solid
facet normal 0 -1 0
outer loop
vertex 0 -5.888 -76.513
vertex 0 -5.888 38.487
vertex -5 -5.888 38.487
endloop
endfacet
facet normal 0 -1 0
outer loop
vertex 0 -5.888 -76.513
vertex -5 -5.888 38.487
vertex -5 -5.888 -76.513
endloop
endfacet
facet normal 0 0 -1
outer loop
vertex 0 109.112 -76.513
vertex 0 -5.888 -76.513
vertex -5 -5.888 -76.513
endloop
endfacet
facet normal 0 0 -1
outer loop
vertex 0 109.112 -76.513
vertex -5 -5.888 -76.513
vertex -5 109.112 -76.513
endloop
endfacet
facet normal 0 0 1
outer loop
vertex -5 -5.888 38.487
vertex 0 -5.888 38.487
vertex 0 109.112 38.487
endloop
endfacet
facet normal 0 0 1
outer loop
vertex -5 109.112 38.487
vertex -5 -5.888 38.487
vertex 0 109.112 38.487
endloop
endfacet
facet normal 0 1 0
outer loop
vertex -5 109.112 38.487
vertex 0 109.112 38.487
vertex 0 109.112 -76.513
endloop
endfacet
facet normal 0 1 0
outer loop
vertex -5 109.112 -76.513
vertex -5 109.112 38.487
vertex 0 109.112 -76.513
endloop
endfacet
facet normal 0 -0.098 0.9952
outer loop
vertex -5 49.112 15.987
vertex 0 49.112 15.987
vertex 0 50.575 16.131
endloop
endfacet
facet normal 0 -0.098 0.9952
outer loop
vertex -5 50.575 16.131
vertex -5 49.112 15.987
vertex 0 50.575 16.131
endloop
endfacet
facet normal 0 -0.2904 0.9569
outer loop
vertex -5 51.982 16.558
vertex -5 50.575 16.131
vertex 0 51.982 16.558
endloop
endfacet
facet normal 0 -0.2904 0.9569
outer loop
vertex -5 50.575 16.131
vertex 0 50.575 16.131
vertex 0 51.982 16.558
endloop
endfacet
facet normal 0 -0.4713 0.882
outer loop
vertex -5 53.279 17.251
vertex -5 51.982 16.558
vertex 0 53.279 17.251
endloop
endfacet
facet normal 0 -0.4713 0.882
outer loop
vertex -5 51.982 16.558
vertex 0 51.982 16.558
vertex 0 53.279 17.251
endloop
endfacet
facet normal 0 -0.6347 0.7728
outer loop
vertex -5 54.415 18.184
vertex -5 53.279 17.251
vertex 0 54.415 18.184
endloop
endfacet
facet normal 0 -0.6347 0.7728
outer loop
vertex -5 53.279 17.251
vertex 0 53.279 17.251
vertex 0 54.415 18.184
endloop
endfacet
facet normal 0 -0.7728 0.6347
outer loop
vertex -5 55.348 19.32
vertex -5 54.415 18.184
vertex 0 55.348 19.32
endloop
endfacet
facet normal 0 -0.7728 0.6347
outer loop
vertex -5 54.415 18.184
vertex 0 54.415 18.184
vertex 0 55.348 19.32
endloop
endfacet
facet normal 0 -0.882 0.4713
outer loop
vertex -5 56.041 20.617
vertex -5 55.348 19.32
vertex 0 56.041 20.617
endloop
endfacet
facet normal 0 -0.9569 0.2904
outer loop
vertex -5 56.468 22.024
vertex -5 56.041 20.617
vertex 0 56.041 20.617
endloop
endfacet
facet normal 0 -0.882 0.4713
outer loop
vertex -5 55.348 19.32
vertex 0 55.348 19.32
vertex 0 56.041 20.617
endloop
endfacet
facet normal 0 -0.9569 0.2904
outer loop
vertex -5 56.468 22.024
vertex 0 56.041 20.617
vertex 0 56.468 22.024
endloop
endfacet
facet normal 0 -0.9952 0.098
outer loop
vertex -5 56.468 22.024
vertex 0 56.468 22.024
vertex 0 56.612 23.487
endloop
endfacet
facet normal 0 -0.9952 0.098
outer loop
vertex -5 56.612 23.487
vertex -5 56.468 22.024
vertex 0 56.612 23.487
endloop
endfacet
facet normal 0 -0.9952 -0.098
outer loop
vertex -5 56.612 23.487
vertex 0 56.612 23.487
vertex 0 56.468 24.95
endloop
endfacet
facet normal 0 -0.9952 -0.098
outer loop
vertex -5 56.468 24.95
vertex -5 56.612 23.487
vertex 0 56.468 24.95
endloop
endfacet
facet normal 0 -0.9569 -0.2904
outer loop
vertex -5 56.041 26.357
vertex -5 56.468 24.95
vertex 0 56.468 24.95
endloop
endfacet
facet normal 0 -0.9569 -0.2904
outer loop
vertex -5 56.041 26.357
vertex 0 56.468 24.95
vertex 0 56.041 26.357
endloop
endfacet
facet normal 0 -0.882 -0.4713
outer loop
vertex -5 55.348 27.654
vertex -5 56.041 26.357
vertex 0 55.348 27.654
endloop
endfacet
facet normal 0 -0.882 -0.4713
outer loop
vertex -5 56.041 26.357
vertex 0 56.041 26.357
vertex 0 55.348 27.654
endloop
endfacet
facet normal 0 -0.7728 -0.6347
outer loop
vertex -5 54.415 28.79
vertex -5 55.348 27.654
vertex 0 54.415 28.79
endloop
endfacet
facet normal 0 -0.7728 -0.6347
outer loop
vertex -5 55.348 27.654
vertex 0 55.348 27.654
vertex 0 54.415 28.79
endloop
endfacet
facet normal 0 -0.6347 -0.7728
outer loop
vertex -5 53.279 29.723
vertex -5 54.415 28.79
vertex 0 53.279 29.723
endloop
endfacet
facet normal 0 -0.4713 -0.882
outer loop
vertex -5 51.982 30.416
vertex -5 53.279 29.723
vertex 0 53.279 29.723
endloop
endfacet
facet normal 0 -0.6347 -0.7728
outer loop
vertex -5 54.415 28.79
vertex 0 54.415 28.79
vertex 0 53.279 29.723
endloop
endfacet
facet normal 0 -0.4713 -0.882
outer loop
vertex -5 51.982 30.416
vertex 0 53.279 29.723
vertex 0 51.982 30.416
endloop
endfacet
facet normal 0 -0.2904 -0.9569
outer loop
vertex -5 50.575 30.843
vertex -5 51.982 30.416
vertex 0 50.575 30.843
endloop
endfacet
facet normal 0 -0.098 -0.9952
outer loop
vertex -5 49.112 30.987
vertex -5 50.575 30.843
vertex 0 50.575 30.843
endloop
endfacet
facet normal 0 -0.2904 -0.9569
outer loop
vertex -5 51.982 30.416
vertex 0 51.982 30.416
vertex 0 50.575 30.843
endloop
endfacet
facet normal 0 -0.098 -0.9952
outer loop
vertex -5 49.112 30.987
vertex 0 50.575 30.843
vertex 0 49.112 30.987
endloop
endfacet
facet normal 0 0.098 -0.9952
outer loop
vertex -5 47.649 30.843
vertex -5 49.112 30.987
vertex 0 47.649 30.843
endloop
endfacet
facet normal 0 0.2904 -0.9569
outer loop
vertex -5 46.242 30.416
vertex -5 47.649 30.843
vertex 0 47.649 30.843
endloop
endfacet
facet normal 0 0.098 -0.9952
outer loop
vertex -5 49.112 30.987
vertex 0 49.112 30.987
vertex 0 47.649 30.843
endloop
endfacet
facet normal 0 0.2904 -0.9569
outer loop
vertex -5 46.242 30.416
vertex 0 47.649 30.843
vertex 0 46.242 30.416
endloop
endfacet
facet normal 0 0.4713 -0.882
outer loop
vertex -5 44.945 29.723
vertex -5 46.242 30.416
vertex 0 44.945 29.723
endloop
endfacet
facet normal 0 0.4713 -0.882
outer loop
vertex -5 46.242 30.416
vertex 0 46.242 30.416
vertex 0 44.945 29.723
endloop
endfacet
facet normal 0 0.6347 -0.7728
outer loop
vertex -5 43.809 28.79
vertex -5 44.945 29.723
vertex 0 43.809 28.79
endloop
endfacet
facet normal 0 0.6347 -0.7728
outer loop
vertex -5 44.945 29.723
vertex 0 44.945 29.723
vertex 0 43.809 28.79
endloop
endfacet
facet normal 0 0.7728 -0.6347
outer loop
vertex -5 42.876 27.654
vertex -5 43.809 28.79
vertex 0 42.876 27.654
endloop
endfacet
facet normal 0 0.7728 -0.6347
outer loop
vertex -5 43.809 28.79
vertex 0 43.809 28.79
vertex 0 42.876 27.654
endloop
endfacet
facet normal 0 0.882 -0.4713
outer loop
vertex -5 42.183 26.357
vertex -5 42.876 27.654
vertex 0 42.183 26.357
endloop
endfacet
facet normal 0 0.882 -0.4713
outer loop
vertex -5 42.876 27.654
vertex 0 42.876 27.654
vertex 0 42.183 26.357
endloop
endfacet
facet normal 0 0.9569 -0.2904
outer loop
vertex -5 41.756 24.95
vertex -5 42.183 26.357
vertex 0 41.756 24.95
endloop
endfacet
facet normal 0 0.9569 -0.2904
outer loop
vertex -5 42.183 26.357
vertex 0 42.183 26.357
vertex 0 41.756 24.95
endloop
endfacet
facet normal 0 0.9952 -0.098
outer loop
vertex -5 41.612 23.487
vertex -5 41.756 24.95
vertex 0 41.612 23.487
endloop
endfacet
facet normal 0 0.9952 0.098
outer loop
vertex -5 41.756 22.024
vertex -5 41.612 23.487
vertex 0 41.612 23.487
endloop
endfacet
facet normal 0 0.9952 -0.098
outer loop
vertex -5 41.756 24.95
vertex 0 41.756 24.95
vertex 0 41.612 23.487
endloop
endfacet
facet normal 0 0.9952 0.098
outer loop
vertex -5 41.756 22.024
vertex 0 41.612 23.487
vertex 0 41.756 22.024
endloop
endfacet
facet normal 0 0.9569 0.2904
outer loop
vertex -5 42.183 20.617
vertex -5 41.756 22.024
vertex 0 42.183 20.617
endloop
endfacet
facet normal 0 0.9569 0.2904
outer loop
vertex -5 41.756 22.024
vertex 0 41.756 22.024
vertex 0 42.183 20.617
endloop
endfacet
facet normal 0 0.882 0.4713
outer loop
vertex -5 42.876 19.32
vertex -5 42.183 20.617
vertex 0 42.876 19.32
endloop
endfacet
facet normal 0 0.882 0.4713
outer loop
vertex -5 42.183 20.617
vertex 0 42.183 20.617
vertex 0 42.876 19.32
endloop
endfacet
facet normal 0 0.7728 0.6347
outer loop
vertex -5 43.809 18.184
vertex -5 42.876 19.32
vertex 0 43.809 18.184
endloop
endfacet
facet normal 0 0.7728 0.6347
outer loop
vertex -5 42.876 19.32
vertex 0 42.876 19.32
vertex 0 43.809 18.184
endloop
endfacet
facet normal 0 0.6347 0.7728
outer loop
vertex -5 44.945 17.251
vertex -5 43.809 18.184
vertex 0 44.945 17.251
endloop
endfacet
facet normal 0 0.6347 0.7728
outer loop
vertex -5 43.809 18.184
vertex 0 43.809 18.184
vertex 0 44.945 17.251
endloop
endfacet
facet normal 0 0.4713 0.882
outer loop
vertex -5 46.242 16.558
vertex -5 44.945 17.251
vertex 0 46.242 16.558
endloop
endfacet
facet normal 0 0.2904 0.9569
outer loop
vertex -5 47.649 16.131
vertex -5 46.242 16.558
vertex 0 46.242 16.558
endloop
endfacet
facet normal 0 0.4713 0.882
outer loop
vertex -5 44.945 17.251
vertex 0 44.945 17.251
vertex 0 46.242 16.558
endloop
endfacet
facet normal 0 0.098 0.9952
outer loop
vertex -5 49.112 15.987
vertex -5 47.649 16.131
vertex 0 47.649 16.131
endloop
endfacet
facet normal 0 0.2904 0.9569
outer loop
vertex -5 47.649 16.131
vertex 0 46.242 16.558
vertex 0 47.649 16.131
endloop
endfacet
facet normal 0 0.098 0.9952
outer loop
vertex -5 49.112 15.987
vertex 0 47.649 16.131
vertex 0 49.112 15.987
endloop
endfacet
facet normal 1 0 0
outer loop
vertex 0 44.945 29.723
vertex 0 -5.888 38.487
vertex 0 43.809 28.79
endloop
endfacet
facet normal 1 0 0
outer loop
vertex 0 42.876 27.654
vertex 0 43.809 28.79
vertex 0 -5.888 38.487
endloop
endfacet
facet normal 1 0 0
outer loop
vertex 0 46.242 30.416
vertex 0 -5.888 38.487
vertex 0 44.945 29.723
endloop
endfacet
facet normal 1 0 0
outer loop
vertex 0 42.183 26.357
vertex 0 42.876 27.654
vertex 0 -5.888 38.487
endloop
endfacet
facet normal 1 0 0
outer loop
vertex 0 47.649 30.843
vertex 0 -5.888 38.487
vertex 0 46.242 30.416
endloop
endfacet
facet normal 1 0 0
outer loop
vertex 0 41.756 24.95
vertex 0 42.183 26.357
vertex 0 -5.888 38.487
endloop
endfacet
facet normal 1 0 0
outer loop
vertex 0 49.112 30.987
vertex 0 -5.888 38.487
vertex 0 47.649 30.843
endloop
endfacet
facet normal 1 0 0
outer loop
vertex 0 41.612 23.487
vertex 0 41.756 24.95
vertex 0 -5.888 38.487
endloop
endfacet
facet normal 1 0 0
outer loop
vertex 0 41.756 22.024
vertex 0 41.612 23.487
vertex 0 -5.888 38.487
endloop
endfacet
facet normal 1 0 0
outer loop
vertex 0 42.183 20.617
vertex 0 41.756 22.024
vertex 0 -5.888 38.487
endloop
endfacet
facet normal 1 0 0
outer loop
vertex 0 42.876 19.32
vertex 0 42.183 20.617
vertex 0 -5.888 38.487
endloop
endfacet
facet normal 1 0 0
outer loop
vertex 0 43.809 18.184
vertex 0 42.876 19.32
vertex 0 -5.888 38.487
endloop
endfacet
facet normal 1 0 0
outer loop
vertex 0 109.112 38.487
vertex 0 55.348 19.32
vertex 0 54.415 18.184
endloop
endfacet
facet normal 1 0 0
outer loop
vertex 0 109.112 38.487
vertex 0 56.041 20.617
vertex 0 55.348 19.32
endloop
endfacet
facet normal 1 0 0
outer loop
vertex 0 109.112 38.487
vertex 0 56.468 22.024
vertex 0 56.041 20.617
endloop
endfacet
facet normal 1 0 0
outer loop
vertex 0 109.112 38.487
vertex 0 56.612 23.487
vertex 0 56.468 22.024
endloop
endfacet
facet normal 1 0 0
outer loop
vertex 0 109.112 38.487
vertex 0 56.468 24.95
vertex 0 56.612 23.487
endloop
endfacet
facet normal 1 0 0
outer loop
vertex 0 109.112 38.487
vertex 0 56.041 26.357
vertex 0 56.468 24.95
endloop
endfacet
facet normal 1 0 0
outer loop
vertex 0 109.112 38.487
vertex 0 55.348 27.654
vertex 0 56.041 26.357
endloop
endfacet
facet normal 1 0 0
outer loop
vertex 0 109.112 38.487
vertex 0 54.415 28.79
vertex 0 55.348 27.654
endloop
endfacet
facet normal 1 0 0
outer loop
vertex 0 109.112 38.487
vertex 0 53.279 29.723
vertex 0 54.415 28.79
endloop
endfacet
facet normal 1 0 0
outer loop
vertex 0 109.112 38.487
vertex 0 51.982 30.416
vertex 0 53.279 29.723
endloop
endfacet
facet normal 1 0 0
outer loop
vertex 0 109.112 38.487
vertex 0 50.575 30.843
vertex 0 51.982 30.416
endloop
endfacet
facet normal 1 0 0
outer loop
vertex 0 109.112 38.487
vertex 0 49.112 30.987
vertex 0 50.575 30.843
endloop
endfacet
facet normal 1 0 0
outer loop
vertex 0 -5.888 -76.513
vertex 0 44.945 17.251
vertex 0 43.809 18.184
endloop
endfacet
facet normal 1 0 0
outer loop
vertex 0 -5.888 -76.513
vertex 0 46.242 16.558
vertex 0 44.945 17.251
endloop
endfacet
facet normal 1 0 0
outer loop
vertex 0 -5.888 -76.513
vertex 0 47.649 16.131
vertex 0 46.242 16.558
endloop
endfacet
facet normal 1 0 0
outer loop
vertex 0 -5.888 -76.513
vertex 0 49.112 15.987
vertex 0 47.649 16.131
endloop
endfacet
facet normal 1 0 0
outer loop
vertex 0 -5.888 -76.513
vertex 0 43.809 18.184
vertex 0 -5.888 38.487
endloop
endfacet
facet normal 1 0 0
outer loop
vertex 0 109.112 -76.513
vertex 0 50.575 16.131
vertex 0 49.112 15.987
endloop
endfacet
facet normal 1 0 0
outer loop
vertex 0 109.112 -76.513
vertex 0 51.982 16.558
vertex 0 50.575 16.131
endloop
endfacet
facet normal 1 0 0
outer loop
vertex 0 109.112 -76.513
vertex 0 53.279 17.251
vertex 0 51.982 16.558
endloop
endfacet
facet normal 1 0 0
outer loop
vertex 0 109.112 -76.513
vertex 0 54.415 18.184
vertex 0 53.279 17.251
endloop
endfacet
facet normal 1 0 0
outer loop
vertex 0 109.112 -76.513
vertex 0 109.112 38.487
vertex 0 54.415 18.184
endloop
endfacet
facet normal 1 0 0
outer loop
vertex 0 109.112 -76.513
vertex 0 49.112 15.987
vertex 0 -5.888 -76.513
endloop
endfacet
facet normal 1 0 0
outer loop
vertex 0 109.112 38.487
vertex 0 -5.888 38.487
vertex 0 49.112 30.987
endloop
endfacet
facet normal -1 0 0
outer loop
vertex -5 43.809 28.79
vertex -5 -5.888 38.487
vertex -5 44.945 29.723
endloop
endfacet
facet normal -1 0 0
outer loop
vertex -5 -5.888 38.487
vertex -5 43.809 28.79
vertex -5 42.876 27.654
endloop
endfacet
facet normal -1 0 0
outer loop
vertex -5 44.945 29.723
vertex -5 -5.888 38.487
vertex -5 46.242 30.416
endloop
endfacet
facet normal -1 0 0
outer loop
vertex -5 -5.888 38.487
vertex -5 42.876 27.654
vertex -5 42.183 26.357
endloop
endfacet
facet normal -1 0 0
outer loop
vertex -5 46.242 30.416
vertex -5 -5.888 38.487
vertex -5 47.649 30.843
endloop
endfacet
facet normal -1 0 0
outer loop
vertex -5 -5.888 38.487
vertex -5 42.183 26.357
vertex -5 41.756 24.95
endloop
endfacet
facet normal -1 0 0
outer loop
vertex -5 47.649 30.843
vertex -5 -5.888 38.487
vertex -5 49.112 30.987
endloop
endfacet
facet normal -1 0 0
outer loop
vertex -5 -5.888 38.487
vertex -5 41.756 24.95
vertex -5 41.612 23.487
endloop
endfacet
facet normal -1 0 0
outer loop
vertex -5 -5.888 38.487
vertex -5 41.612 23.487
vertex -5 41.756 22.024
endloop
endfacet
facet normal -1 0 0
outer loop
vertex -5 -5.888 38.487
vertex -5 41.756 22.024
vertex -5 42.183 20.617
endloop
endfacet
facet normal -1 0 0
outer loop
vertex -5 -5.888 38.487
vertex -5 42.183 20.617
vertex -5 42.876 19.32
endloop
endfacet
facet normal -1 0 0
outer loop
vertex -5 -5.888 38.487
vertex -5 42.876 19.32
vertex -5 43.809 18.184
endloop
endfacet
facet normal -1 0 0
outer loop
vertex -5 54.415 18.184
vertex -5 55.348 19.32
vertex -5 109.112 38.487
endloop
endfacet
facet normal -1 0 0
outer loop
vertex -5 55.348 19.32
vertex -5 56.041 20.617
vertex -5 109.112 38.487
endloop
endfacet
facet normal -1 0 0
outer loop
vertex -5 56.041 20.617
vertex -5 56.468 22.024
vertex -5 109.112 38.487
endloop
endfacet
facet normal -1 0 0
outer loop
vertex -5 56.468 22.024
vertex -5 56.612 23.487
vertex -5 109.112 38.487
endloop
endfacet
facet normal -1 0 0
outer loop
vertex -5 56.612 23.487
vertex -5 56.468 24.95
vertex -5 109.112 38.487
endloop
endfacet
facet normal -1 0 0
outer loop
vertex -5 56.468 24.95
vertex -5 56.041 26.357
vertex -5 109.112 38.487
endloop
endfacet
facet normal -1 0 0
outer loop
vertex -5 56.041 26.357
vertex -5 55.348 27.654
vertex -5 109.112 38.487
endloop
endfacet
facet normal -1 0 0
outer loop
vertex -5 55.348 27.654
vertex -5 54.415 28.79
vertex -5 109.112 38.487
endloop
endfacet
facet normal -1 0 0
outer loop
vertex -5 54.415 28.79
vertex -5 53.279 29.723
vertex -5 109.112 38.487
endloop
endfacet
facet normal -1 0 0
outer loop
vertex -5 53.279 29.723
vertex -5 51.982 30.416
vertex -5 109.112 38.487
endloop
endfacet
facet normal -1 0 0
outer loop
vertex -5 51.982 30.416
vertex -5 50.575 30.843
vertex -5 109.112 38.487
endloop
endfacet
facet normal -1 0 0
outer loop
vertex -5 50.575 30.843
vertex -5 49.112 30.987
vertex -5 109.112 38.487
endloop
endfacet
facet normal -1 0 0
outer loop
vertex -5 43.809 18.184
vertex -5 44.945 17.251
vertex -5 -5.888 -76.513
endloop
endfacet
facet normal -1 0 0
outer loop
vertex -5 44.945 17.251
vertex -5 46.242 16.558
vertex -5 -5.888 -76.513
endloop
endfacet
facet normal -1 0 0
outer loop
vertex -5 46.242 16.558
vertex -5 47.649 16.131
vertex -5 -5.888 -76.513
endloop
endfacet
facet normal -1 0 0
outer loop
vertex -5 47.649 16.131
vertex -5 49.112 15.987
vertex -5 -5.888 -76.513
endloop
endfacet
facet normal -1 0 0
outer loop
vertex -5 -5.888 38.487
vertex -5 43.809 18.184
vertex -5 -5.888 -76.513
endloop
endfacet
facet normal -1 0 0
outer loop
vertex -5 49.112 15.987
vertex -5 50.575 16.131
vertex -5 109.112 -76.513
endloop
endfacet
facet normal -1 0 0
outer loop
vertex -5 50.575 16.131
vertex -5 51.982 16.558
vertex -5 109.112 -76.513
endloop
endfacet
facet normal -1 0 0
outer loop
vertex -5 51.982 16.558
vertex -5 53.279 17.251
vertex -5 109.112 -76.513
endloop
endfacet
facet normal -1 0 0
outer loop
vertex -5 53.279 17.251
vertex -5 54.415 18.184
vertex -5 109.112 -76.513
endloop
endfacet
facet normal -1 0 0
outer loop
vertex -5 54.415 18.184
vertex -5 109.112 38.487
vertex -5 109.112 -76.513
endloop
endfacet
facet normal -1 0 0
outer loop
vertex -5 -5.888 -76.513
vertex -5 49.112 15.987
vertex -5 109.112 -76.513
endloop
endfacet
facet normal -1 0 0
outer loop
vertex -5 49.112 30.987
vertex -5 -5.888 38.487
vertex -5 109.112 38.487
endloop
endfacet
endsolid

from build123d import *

# Parameters (mm, degrees)
SKETCH_1_W      = 115
SKETCH_1_H      = 115
SKETCH_1_R      = 7.5
EXTRUDE_1_DEPTH = 5


with BuildPart() as part:
    # 草圖1 → 填料-伸長1 (new body)
    with BuildSketch(Plane(origin=(0, 0, 0), x_dir=(0, 0, -1), z_dir=(1, 0, 0))):
        with Locations((19.013157895, 51.611842105)):
            Rectangle(SKETCH_1_W, SKETCH_1_H)
        with Locations((-23.486842105, 49.111842105)):
            Circle(SKETCH_1_R, mode=Mode.SUBTRACT)
    extrude(amount=-EXTRUDE_1_DEPTH)


solid = part.part
